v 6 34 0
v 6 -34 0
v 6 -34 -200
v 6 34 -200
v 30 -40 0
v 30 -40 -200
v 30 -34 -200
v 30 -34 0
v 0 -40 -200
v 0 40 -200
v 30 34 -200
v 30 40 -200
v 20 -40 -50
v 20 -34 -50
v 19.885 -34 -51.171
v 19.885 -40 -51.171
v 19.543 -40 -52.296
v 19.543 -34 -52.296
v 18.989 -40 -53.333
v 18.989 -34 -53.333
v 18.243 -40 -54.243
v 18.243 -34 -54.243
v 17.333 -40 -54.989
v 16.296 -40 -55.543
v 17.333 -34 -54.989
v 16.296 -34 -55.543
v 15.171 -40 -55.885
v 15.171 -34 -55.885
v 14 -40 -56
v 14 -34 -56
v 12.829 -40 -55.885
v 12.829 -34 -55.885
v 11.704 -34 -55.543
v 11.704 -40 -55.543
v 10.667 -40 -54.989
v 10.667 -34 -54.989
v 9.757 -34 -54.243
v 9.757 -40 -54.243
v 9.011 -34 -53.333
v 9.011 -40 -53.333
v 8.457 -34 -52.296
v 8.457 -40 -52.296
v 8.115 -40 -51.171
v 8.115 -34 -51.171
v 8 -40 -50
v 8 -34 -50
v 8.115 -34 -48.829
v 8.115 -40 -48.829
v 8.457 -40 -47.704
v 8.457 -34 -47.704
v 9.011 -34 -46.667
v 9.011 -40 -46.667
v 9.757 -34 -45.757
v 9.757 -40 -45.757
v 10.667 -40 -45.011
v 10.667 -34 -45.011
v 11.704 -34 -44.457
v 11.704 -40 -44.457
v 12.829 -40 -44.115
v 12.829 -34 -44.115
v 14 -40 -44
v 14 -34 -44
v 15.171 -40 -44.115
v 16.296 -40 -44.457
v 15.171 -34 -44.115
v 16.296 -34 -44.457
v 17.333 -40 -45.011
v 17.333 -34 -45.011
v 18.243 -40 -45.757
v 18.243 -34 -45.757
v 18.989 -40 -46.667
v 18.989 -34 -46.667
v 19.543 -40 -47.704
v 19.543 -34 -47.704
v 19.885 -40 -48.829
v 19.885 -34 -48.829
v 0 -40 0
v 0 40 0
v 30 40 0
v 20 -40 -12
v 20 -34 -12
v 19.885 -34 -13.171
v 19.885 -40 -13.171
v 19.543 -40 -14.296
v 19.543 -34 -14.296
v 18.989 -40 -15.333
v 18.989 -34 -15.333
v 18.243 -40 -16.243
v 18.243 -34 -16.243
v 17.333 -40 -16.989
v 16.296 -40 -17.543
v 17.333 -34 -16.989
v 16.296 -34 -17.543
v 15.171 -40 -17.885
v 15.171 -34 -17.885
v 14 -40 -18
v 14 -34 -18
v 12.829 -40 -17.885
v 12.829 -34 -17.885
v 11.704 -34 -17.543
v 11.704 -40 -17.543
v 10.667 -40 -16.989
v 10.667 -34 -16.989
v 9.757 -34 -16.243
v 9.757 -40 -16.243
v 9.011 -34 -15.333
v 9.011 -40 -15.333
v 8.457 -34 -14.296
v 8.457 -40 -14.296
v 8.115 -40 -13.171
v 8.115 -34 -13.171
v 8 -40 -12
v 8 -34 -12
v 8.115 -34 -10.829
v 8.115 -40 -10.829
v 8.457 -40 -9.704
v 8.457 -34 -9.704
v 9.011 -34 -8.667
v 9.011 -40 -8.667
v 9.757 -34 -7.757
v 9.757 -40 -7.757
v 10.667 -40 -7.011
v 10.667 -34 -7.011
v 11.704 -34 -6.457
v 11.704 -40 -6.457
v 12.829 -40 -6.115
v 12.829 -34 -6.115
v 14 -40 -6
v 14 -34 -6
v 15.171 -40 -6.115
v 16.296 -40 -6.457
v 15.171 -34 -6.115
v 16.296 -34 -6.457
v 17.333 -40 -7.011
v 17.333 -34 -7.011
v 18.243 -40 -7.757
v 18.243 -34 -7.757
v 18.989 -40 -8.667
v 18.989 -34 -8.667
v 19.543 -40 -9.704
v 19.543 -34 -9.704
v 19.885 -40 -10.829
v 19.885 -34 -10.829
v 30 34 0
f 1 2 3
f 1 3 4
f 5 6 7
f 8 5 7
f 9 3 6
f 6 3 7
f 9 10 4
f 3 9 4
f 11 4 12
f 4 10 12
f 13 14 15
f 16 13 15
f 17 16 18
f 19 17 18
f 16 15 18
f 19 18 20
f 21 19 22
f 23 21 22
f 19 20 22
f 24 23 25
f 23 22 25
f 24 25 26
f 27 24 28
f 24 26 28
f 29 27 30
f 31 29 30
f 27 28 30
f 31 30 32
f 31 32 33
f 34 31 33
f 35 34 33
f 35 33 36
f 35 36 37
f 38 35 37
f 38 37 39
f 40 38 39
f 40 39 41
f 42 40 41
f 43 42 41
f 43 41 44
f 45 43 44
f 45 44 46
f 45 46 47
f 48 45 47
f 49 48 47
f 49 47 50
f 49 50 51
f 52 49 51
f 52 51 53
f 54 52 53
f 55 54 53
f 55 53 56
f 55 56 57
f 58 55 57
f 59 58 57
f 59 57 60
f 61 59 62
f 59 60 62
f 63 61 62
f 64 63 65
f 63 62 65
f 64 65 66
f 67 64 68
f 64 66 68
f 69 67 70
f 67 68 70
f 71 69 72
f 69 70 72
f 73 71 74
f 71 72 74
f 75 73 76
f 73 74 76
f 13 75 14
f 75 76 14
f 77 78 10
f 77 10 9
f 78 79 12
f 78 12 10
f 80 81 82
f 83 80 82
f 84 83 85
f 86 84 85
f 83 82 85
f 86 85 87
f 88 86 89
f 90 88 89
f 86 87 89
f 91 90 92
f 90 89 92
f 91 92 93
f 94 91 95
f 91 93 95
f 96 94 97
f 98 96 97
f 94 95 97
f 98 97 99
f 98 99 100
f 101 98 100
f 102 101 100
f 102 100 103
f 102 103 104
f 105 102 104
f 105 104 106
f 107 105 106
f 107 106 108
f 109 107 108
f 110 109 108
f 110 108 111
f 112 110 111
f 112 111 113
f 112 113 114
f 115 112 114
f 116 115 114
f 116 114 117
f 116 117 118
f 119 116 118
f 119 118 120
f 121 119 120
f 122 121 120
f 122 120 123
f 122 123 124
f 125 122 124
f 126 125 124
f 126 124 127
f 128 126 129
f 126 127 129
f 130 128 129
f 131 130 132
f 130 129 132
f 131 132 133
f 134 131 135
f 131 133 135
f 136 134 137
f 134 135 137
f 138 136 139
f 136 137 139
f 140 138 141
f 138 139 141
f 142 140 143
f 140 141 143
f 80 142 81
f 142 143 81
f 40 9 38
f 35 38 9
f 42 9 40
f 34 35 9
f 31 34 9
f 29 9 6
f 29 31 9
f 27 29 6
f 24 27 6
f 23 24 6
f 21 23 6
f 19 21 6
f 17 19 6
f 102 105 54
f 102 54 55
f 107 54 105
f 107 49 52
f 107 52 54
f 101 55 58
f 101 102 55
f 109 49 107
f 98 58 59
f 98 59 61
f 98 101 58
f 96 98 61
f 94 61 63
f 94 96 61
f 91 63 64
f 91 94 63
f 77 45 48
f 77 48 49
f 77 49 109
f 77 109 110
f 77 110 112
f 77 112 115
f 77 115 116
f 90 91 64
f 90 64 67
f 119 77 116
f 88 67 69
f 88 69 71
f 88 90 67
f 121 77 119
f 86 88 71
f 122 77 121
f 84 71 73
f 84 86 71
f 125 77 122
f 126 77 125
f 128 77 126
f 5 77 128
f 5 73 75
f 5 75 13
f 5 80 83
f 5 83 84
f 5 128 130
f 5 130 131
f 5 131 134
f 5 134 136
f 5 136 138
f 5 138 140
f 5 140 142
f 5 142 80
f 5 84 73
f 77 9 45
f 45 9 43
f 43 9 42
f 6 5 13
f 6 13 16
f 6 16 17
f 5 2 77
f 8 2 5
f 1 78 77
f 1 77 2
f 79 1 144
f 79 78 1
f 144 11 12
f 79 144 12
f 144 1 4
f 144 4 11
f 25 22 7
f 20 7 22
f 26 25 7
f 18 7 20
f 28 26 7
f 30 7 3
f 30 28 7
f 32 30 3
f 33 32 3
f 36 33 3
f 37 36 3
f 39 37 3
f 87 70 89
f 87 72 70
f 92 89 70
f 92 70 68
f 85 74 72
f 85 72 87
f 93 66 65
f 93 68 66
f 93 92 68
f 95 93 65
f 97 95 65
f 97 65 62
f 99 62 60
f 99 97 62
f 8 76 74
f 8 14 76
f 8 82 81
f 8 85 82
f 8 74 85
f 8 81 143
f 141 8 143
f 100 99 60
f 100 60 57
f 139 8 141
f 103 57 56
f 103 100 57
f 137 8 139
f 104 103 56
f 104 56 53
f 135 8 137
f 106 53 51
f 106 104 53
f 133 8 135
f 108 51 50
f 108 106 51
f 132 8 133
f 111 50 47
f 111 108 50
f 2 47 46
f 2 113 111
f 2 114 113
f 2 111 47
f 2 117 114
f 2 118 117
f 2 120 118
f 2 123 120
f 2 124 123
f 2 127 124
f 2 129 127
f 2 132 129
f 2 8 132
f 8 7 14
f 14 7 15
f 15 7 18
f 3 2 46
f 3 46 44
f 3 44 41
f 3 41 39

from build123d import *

# Parameters (mm, degrees)
LINEAR_AUSTRAGEN_D_NN1_DEPTH    = 200
SKIZZE2_R                       = 6
SCHNITT_LINEAR_AUSTRAGEN1_DEPTH = 60


with BuildPart() as part:
    # Skizze1 → Linear-Austragen-Dünn1 (new body)
    with BuildSketch(Plane.XY):
        Polygon((30, 40), (0, 40), (0, -40), (30, -40), (30, -34), (6, -34), (6, 34), (30, 34), align=None)
    extrude(amount=-LINEAR_AUSTRAGEN_D_NN1_DEPTH)

    # Skizze2 → Schnitt-Linear austragen1 (cut)
    with BuildSketch(Plane(origin=(0, 0, 0), x_dir=(1, 0, 0), z_dir=(0, 1, 0))):
        with Locations((14, 50)):
            Circle(SKIZZE2_R)
        with Locations((14, 12)):
            Circle(SKIZZE2_R)
    extrude(amount=-SCHNITT_LINEAR_AUSTRAGEN1_DEPTH, mode=Mode.SUBTRACT)


solid = part.part
